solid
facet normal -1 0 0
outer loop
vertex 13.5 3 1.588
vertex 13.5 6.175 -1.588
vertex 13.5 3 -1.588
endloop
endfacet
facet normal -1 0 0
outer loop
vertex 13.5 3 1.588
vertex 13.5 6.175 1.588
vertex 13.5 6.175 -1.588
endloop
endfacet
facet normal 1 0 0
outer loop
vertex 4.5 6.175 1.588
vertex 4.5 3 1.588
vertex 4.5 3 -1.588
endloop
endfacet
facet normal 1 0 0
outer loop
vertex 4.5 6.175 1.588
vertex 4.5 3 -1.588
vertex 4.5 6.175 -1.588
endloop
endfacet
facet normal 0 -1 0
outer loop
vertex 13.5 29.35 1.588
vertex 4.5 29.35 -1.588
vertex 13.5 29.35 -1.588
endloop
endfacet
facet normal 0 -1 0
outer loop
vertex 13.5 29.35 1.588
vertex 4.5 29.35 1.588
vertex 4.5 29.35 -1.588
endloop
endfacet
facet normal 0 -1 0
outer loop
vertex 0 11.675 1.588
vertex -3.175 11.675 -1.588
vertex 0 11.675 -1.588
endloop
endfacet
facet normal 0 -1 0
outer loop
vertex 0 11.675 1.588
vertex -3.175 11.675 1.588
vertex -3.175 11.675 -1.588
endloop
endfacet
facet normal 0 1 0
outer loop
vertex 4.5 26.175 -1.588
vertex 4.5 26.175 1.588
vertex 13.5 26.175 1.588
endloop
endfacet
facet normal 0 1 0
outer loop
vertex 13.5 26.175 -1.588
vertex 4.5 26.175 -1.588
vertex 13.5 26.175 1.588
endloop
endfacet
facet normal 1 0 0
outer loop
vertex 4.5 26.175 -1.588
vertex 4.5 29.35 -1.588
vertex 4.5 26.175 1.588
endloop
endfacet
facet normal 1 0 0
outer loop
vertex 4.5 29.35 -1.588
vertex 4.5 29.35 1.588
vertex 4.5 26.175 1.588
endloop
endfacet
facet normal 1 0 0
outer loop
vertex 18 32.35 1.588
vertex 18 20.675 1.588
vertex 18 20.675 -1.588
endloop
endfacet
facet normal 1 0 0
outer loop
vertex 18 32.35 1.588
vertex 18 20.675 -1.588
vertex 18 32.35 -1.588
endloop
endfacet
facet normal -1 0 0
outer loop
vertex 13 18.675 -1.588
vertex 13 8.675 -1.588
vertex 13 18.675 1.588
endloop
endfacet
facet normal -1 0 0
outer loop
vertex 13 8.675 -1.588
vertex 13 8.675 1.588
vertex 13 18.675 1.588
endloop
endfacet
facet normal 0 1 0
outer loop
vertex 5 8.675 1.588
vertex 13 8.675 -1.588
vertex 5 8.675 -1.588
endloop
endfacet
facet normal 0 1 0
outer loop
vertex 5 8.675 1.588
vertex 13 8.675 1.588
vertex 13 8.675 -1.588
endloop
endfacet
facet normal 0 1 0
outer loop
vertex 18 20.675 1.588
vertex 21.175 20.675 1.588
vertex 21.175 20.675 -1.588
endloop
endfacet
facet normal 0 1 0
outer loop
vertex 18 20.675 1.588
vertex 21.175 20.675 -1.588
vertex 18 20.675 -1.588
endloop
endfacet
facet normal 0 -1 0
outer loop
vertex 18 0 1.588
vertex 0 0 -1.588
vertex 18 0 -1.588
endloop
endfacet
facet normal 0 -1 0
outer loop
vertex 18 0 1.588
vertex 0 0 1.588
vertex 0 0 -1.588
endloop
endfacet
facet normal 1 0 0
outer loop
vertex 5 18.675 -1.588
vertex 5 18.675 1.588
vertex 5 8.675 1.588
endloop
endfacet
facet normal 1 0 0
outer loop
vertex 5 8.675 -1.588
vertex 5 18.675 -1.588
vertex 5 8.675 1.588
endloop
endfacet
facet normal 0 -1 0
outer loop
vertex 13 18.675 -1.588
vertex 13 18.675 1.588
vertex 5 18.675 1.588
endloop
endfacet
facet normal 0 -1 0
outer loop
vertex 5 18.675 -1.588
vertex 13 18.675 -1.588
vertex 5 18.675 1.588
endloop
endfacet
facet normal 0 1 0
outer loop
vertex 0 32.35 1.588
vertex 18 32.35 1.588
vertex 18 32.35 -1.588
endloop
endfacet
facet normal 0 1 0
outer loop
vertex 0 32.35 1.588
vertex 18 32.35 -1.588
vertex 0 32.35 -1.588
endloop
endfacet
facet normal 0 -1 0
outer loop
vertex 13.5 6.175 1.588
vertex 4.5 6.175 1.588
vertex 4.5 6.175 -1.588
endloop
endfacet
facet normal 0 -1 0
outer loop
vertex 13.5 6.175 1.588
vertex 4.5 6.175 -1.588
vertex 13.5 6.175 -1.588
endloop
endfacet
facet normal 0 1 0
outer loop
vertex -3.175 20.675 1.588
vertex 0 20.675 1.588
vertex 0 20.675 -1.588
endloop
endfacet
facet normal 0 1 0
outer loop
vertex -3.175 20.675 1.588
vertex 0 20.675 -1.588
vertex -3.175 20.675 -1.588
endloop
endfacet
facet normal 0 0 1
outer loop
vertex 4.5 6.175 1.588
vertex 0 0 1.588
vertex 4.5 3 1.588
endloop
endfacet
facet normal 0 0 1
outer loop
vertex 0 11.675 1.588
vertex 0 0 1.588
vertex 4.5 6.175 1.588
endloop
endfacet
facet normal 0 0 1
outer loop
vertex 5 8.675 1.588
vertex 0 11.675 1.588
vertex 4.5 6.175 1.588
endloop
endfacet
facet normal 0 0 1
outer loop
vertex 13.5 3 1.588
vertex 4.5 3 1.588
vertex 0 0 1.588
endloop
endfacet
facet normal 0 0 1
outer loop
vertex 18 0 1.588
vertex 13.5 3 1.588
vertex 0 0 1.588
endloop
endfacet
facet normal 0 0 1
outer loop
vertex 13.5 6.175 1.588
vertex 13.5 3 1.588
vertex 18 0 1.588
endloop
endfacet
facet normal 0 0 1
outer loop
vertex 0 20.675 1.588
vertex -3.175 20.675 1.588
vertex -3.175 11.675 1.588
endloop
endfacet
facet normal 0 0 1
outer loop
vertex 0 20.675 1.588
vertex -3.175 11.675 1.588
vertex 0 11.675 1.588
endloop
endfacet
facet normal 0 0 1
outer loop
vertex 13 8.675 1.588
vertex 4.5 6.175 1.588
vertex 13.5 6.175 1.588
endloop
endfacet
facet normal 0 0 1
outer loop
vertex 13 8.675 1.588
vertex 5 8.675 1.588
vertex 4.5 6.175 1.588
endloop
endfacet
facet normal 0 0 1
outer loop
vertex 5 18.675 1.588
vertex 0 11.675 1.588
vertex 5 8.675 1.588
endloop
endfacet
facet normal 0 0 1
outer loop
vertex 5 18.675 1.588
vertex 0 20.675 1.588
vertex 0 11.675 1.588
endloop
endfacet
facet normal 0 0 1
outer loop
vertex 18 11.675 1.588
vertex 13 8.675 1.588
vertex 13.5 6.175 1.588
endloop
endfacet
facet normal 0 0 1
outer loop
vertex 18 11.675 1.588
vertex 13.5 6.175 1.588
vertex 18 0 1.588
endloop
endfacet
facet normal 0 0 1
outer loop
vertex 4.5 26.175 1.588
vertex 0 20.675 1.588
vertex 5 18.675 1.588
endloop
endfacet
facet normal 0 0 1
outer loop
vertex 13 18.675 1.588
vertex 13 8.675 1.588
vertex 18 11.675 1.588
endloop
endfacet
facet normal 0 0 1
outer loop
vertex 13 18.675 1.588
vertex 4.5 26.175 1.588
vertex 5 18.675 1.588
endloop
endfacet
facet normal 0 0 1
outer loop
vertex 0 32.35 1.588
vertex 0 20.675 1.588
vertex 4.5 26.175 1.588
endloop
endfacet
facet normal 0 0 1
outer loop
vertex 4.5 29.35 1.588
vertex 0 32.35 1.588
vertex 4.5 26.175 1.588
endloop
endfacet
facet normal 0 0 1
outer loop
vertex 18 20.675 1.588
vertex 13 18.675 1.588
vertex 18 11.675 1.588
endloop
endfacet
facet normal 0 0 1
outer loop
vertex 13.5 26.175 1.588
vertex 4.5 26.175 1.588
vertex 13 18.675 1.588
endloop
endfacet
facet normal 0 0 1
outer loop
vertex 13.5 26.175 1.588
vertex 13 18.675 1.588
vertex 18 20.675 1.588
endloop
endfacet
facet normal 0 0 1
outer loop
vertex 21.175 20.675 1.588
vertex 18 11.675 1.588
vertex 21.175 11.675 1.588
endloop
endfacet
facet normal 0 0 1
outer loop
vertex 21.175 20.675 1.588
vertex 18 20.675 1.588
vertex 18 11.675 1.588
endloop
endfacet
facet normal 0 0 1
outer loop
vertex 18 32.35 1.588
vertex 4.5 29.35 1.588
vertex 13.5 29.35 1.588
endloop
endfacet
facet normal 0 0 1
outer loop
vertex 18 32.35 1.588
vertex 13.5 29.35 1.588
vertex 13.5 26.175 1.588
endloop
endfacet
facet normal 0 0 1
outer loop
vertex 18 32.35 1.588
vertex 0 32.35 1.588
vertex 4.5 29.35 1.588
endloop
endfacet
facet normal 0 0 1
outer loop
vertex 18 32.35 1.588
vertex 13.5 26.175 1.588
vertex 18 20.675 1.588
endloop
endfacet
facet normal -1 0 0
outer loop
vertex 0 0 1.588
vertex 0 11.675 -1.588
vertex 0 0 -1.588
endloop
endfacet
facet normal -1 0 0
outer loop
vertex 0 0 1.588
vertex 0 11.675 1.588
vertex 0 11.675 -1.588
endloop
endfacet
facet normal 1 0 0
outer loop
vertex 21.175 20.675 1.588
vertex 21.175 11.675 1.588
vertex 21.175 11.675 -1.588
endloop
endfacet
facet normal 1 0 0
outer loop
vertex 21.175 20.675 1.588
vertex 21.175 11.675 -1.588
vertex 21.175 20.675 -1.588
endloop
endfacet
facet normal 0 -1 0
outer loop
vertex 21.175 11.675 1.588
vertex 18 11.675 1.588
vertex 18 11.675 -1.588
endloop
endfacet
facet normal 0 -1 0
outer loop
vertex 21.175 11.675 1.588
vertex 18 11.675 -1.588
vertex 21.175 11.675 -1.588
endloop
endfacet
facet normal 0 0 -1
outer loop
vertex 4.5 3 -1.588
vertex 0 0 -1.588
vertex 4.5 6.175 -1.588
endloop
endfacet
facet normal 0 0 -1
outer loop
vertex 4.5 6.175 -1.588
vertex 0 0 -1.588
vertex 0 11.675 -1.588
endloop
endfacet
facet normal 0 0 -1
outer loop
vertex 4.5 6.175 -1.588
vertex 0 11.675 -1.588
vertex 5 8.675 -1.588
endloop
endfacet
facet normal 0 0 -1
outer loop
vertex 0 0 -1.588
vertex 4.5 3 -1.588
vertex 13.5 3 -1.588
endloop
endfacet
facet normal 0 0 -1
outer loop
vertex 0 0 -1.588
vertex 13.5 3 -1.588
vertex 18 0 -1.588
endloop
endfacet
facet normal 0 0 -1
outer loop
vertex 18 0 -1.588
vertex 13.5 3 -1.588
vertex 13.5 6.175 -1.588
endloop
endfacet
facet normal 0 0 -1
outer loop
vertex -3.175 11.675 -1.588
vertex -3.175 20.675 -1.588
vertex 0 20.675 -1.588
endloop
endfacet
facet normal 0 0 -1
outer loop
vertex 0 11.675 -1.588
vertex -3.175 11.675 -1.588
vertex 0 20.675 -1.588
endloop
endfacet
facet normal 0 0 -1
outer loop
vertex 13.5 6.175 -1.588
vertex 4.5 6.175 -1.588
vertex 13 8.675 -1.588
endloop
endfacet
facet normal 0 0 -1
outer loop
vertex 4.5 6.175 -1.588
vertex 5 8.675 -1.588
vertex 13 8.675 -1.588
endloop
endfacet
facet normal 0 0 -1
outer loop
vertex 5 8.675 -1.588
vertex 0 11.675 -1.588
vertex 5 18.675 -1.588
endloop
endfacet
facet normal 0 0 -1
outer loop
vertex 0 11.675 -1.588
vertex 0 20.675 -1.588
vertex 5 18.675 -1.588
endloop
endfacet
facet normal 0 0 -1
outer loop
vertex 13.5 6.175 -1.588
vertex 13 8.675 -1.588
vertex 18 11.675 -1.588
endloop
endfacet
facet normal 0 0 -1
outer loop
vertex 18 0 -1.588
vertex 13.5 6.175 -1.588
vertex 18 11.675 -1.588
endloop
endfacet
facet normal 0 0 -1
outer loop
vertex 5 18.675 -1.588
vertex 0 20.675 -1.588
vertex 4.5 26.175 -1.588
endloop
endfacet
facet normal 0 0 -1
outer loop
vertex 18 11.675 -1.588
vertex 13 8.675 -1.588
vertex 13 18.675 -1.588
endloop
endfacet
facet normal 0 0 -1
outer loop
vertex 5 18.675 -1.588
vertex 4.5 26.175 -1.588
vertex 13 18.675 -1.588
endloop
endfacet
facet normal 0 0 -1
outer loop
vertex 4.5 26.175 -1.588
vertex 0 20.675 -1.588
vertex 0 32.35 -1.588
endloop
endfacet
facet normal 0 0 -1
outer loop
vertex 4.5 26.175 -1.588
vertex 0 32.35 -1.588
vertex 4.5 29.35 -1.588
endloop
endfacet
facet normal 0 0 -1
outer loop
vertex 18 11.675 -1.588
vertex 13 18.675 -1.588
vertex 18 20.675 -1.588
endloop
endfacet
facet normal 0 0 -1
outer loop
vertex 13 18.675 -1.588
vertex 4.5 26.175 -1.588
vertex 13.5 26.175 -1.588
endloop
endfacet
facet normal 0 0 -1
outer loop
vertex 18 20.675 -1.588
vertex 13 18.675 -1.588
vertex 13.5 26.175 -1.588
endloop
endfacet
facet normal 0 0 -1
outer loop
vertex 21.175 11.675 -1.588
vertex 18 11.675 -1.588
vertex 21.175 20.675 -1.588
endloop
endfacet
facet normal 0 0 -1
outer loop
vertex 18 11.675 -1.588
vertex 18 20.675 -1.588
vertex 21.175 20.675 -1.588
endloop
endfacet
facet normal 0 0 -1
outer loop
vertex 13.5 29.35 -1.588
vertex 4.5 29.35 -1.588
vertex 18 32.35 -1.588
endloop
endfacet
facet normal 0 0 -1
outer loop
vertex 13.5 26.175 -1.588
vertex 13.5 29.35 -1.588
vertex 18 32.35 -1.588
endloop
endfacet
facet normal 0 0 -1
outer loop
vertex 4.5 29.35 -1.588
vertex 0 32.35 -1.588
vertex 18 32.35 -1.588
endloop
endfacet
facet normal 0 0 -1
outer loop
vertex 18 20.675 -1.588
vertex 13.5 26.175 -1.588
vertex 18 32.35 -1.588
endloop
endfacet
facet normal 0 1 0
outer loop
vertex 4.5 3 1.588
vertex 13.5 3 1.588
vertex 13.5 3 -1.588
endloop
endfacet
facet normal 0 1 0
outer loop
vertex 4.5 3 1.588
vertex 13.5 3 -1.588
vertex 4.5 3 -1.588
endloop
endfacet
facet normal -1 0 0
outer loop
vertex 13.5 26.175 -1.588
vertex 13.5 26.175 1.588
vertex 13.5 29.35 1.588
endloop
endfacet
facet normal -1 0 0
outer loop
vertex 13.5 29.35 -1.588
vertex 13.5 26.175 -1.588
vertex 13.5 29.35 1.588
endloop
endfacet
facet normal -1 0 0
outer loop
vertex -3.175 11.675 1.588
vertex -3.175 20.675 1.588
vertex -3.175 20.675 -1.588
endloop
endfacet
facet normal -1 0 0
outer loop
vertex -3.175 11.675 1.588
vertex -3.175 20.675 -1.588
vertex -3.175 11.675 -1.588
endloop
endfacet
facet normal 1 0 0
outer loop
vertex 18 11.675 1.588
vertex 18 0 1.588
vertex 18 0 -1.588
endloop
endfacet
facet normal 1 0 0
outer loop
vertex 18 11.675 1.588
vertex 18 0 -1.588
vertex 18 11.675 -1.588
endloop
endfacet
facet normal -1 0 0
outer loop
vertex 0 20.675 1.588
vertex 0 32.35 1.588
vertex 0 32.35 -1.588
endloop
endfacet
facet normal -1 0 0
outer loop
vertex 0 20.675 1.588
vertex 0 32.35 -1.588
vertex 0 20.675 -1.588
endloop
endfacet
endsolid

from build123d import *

# Parameters (mm, degrees)
BOSS_EXTRUDE1_DEPTH = 1.5875


with BuildPart() as part:
    # Sketch2 → Boss-Extrude1 (new body, symmetric)
    with BuildSketch(Plane.XY):
        Polygon((0, 0), (18, 0), (18, 11.675), (21.175, 11.675), (21.175, 20.675), (18, 20.675), (18, 32.35), (0, 32.35), (0, 20.675), (-3.175, 20.675), (-3.175, 11.675), (0, 11.675), align=None)
        Polygon((9, 29.35), (4.5, 29.35), (4.5, 26.175), (13.5, 26.175), (13.5, 29.35), align=None, mode=Mode.SUBTRACT)
        Polygon((13.5, 3), (9, 3), (4.5, 3), (4.5, 6.175), (13.5, 6.175), align=None, mode=Mode.SUBTRACT)
        Polygon((9, 8.675), (13, 8.675), (13, 18.675), (5, 18.675), (5, 8.675), align=None, mode=Mode.SUBTRACT)
    extrude(amount=BOSS_EXTRUDE1_DEPTH, both=True)


solid = part.part
